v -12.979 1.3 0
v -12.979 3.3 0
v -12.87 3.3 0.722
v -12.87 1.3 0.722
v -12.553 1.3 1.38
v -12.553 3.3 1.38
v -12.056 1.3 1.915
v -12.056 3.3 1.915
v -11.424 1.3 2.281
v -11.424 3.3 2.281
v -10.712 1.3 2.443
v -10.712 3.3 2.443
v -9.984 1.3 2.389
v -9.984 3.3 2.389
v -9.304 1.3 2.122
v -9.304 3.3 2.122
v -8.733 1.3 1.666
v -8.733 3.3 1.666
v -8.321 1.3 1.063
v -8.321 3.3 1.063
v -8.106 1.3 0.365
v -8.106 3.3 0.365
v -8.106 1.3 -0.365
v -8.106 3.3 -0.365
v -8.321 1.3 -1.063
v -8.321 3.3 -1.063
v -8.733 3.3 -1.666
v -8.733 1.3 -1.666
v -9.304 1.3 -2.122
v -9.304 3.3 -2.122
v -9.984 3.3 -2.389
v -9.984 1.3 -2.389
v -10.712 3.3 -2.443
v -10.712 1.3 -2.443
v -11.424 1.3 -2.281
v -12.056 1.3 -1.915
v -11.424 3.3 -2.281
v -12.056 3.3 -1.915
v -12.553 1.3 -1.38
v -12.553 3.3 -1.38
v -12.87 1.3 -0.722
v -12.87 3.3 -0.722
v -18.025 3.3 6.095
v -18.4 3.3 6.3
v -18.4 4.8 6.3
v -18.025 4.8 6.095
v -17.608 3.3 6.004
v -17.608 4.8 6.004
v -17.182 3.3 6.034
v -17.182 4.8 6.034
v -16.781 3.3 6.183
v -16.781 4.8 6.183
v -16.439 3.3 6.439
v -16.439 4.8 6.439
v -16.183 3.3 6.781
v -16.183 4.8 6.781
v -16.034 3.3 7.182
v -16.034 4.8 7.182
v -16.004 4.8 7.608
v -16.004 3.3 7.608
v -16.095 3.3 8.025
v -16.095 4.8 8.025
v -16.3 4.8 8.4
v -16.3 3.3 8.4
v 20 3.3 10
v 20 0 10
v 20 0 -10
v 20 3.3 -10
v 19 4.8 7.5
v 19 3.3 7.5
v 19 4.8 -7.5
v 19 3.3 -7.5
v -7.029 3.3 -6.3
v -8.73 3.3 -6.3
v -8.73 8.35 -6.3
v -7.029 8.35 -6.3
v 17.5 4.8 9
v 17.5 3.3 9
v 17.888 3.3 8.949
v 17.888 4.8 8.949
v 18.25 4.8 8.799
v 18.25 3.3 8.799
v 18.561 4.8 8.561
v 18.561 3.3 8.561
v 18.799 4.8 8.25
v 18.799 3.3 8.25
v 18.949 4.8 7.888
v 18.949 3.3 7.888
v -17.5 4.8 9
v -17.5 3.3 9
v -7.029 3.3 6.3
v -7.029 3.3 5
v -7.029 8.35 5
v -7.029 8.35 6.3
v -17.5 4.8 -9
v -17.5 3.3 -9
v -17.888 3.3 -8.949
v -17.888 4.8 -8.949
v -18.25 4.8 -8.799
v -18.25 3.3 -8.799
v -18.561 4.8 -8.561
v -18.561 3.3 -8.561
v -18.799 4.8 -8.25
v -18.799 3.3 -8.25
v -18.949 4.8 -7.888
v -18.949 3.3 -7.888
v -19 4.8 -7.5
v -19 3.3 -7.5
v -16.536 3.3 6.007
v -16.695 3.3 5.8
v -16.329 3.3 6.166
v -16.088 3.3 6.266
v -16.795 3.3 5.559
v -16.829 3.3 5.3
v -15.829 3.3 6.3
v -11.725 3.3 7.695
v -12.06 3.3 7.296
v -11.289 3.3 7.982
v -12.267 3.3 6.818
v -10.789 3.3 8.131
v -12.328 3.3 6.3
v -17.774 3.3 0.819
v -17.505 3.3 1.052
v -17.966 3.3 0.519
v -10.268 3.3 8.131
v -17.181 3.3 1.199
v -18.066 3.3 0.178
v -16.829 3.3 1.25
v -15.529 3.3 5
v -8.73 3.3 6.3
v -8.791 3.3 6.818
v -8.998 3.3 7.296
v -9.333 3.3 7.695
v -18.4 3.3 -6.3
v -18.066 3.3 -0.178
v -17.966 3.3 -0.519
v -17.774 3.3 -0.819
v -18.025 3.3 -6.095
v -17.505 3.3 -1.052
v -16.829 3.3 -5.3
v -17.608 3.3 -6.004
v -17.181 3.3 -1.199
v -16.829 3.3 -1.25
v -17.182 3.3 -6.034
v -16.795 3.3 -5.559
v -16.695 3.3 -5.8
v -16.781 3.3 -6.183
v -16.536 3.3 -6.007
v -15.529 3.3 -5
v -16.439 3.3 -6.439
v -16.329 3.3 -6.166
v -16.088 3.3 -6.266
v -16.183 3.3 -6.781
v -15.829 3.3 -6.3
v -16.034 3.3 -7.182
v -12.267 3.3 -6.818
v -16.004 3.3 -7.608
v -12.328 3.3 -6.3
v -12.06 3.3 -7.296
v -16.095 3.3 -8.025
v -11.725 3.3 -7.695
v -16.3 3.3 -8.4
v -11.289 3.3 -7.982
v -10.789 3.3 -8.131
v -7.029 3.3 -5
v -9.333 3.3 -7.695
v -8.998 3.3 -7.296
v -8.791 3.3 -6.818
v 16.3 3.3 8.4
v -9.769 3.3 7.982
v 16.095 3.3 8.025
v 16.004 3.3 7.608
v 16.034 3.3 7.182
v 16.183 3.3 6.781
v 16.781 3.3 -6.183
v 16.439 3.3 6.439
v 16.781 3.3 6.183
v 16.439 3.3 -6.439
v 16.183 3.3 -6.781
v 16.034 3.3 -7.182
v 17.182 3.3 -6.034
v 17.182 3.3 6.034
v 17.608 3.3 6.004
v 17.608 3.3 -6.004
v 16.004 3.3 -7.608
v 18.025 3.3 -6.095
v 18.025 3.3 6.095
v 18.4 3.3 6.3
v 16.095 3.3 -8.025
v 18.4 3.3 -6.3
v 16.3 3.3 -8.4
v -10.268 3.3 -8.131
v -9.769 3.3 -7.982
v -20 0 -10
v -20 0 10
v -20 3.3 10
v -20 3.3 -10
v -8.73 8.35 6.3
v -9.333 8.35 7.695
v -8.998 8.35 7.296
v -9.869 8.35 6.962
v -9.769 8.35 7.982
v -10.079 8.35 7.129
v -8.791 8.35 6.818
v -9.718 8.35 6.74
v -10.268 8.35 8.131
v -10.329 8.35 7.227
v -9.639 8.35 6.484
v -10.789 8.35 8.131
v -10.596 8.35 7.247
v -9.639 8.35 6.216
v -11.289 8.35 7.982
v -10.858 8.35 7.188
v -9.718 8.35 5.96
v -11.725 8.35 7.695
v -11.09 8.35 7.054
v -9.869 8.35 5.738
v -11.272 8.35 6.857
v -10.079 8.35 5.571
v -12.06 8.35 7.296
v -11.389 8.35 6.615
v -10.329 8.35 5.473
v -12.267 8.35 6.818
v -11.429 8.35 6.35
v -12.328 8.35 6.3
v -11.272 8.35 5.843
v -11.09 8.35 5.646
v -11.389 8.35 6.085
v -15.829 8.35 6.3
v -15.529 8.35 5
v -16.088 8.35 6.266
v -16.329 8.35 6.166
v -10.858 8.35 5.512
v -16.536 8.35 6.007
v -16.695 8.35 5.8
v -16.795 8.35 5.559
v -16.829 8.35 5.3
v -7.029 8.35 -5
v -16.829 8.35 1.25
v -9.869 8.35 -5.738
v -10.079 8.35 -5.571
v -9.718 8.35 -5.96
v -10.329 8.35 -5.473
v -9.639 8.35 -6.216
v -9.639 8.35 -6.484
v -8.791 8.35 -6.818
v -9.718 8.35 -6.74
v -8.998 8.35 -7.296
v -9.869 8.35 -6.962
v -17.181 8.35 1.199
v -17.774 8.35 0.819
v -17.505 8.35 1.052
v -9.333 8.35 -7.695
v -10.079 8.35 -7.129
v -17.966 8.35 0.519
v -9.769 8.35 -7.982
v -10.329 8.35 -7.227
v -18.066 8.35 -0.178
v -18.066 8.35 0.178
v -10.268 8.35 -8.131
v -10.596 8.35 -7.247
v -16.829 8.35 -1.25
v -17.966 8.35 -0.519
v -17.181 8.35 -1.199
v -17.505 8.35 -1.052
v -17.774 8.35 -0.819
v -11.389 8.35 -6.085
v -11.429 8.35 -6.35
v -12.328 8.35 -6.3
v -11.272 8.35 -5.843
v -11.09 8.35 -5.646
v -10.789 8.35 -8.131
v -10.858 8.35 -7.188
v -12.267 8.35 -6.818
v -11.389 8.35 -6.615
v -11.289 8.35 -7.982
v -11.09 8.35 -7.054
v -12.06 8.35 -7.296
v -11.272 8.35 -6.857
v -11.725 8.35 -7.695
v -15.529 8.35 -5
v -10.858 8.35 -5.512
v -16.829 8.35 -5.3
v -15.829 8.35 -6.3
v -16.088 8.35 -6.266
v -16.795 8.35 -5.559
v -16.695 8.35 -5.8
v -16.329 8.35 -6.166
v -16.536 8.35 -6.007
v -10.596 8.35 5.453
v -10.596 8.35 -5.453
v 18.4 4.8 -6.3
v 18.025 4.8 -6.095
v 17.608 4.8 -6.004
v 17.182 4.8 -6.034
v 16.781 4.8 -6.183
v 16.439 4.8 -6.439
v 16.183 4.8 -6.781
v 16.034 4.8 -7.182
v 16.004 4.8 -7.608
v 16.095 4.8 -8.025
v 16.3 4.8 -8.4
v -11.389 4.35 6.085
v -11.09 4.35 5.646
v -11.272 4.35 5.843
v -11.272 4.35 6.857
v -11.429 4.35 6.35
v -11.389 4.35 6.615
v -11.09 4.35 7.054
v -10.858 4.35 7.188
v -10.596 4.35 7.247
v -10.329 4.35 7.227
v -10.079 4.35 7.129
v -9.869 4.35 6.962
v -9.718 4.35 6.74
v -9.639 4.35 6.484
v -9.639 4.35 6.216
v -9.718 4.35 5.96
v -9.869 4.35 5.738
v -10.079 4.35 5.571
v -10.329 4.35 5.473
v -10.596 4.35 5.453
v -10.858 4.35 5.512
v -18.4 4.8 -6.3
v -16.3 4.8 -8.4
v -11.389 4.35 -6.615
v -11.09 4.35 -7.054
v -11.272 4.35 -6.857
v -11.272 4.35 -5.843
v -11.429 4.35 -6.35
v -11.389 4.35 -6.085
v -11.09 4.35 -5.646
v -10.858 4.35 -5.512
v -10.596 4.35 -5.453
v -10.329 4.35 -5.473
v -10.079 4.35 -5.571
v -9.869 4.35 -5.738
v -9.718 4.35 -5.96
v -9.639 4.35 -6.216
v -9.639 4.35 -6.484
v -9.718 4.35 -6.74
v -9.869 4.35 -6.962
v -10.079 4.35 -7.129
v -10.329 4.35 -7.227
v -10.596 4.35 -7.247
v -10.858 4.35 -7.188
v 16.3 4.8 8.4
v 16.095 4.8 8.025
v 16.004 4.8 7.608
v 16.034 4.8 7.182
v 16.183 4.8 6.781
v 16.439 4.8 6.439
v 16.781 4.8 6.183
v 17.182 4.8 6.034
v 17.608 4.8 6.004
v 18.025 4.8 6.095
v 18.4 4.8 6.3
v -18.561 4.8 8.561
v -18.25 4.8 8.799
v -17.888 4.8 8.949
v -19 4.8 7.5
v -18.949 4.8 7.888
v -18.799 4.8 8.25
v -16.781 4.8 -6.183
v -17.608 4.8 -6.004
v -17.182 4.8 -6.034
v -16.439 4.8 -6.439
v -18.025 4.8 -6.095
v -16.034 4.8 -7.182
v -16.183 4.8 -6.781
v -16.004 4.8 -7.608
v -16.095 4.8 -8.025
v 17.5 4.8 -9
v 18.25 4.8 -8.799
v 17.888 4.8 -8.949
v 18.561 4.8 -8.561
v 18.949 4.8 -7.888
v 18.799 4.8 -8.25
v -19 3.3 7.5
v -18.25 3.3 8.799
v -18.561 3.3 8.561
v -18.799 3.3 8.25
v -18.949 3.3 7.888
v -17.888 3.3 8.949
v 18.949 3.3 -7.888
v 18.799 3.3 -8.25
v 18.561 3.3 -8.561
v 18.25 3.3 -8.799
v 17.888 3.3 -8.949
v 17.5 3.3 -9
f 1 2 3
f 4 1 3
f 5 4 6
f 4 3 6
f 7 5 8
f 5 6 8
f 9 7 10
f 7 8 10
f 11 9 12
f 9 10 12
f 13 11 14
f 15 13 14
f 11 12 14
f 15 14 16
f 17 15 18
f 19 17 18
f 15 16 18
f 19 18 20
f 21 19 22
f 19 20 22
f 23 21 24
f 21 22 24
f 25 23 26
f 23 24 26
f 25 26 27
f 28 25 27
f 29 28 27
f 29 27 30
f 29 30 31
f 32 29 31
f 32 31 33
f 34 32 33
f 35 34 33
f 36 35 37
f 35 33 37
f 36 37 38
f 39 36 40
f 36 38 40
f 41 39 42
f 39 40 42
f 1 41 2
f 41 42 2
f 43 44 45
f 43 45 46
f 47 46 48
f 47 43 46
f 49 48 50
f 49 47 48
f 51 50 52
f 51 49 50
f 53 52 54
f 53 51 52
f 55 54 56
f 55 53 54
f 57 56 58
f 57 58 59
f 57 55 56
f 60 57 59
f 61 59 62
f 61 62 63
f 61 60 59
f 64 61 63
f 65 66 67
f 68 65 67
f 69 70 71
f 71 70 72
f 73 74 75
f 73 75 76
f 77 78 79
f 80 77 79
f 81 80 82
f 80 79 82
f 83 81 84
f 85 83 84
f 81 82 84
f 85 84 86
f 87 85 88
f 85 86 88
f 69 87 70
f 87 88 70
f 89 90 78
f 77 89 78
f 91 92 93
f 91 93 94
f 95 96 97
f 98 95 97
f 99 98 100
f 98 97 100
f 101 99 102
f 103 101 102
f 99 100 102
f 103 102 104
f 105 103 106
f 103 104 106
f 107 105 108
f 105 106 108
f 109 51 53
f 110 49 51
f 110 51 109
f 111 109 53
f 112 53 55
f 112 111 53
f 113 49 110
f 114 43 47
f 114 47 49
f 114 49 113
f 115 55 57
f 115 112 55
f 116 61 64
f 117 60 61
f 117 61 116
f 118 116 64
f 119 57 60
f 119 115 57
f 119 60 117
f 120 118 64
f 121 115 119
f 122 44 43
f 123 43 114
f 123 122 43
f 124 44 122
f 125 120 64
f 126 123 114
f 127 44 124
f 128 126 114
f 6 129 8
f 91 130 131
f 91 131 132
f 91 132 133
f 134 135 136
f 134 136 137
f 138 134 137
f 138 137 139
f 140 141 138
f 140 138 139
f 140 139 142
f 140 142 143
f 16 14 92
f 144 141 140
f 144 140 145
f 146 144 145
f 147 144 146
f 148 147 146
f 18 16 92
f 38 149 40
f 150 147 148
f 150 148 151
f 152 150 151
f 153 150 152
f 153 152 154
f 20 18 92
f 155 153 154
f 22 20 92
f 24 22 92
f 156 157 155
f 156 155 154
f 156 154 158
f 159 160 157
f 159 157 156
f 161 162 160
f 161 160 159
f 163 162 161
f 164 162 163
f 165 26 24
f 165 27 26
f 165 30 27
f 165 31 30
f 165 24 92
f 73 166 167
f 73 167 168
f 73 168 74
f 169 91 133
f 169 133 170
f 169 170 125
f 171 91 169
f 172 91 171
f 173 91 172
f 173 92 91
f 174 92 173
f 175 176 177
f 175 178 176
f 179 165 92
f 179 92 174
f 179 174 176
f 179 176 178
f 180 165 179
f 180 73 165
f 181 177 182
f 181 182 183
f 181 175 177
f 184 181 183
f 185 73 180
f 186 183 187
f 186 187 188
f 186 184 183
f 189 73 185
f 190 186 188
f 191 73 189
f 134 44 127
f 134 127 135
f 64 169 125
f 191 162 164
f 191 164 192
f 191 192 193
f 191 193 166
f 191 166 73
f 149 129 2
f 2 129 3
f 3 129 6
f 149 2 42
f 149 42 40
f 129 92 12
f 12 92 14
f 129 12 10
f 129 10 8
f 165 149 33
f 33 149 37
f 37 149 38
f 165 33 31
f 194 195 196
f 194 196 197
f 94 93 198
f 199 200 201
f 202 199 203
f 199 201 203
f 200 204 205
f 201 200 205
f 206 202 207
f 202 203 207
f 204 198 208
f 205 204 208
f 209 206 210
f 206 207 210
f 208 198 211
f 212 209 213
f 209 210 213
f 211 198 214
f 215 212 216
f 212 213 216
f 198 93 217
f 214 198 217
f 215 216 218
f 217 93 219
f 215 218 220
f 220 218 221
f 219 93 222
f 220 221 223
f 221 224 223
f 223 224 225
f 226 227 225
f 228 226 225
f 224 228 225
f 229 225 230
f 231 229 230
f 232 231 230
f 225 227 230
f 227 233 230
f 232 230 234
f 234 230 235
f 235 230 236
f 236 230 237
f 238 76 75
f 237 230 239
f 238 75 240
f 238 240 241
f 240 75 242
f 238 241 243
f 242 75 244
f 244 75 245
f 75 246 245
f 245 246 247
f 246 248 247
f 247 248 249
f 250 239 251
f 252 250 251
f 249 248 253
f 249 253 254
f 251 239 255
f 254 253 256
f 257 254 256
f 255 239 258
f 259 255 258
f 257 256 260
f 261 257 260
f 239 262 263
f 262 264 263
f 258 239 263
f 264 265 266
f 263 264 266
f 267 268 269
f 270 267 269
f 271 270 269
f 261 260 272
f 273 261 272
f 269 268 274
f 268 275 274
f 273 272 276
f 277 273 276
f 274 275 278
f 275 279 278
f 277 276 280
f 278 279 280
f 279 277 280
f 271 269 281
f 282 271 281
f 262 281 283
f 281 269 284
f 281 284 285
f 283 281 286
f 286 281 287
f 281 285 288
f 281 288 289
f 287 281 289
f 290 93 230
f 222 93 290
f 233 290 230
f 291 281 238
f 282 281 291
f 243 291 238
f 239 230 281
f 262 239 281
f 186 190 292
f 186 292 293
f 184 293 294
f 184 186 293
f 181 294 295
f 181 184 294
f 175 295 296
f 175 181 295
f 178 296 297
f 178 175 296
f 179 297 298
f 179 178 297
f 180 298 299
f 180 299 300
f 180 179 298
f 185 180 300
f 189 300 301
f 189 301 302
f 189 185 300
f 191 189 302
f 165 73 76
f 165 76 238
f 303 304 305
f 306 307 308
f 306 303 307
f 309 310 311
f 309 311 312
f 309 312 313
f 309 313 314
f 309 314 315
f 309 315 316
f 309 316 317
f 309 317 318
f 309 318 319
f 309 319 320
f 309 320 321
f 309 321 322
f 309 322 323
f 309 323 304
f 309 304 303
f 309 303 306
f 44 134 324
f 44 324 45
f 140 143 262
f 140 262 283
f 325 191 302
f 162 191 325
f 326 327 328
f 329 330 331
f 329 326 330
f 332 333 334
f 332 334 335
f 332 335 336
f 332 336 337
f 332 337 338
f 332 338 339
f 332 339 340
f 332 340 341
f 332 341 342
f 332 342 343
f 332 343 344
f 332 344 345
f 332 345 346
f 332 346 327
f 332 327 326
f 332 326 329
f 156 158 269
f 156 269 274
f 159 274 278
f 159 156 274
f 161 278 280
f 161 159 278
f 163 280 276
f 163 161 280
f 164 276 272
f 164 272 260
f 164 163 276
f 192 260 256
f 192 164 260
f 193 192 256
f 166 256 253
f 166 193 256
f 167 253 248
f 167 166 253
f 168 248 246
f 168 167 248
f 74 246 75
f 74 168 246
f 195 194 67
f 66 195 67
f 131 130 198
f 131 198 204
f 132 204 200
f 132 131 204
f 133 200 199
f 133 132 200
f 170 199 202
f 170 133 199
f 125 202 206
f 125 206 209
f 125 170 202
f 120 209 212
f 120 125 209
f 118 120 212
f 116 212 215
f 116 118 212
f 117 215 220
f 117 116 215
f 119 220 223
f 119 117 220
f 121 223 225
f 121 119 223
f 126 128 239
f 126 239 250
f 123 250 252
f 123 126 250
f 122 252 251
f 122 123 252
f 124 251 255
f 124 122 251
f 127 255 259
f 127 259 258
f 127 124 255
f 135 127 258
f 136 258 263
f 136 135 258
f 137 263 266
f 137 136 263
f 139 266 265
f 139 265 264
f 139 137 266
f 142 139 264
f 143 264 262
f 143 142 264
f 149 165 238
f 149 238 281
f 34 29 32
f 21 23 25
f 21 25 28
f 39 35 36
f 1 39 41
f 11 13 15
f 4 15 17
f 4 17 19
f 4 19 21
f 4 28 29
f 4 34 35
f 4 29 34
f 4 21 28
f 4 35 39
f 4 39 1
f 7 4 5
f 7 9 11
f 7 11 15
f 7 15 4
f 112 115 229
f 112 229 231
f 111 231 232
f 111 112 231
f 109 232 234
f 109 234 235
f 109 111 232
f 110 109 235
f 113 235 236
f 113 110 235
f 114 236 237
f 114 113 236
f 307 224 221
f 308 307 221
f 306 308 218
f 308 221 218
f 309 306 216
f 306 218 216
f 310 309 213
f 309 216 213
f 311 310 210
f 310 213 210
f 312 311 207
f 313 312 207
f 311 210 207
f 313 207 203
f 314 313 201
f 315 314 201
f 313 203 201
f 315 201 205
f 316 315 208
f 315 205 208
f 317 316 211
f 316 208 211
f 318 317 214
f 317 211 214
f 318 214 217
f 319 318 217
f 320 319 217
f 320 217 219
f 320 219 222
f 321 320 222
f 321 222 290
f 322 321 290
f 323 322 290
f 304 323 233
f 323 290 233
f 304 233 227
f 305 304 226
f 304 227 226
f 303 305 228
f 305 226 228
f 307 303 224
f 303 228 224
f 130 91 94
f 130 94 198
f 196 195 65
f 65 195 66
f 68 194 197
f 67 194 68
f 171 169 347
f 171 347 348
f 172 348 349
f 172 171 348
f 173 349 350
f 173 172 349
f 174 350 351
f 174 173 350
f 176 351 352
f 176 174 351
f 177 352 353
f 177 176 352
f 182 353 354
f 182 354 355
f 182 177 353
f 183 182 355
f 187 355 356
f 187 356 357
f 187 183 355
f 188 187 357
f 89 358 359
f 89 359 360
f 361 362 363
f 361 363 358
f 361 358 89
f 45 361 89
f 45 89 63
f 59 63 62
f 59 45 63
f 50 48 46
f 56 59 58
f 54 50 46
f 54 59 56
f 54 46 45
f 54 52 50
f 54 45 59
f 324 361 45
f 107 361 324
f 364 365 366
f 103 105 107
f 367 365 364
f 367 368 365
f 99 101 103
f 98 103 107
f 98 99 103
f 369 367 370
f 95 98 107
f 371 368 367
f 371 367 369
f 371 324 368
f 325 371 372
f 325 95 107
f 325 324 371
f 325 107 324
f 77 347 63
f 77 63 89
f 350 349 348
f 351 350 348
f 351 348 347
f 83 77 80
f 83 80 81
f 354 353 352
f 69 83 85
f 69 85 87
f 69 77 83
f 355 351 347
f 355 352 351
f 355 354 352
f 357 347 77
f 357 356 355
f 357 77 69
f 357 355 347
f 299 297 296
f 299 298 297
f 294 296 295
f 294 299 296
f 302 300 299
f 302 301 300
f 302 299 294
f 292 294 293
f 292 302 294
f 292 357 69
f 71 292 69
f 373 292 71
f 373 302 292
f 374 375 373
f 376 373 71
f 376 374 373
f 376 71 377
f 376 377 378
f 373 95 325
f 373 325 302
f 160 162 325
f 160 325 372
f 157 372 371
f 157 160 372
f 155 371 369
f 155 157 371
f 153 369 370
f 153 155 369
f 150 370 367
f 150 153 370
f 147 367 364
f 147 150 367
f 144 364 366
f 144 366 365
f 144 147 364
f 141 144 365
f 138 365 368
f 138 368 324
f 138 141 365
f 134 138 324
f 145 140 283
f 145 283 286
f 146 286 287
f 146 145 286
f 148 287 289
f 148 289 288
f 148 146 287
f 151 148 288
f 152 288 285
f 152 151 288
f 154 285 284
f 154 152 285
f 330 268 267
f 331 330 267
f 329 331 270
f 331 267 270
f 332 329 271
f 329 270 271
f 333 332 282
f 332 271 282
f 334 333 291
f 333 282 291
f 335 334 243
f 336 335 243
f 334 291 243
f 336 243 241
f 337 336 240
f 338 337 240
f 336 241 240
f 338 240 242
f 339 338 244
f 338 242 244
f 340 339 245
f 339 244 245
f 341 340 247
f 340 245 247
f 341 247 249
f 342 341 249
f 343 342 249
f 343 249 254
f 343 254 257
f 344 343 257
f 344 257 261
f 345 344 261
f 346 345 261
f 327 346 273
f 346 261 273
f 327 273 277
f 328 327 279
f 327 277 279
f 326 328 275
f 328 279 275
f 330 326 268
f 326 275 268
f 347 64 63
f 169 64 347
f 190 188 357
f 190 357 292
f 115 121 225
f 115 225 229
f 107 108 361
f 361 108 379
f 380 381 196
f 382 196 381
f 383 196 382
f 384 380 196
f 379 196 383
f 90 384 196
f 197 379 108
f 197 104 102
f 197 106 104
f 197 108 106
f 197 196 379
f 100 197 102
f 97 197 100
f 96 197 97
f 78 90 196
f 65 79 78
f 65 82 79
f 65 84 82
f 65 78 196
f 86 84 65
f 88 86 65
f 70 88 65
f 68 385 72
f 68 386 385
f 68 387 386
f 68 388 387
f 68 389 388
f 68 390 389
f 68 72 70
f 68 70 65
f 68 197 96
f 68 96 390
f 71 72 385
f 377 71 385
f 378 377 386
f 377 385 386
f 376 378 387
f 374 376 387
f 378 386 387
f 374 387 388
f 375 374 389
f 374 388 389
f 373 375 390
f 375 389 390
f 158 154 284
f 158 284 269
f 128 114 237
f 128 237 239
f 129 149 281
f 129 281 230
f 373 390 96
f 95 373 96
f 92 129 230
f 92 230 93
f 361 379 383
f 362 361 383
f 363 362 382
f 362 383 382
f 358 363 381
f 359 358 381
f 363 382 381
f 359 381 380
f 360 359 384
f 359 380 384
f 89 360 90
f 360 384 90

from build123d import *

# Parameters (mm, degrees)
SKETCH1_W           = 40
SKETCH1_H           = 20
BOSS_EXTRUDE1_DEPTH = 3.3
BOSS_EXTRUDE2_DEPTH = 1.5
SKETCH3_R           = 2.45
CUT_EXTRUDE1_DEPTH  = 2
BOSS_EXTRUDE3_DEPTH = 5.05
SKETCH5_R           = 0.9
CUT_EXTRUDE2_DEPTH  = 4


with BuildPart() as part:
    # Sketch1 → Boss-Extrude1 (new body)
    with BuildSketch(Plane(origin=(0, 0, 0), x_dir=(1, 0, 0), z_dir=(0, 1, 0))):
        Rectangle(SKETCH1_W, SKETCH1_H)
    extrude(amount=BOSS_EXTRUDE1_DEPTH)

    # Sketch2 → Boss-Extrude2 (add)
    with BuildSketch(Plane(origin=(0, 3.3, 0), x_dir=(1, 0, 0), z_dir=(0, 1, 0))):
        with BuildLine():
            Line((-19, 7.5), (-19, -7.5))
            ThreePointArc((-19, -7.5), (-18.560660172, -8.560660172), (-17.5, -9))
            Line((-17.5, -9), (17.5, -9))
            ThreePointArc((17.5, -9), (18.560660172, -8.560660172), (19, -7.5))
            Line((19, -7.5), (19, 7.5))
            ThreePointArc((19, 7.5), (18.560660172, 8.560660172), (17.5, 9))
            Line((17.5, 9), (-17.5, 9))
            ThreePointArc((-17.5, 9), (-18.560660172, 8.560660172), (-19, 7.5))
        make_face()
        with BuildLine():
            Line((-18.4, 6.3), (-18.4, -6.3))
            ThreePointArc((-18.4, -6.3), (-16.439339828, -6.439339828), (-16.3, -8.4))
            Line((-16.3, -8.4), (16.3, -8.4))
            ThreePointArc((16.3, -8.4), (16.439339828, -6.439339828), (18.4, -6.3))
            Line((18.4, -6.3), (18.4, 6.3))
            ThreePointArc((18.4, 6.3), (16.439339828, 6.439339828), (16.3, 8.4))
            Line((16.3, 8.4), (-16.3, 8.4))
            ThreePointArc((-16.3, 8.4), (-16.439339828, 6.439339828), (-18.4, 6.3))
        make_face(mode=Mode.SUBTRACT)
    extrude(amount=BOSS_EXTRUDE2_DEPTH)

    # Sketch3 → Cut-Extrude1 (cut)
    with BuildSketch(Plane(origin=(0, 3.3, 0), x_dir=(-1, 0, 0), z_dir=(0, 1, 0))):
        with Locations((10.52883238, 0)):
            Circle(SKETCH3_R)
    extrude(amount=-CUT_EXTRUDE1_DEPTH, mode=Mode.SUBTRACT)

    # Sketch4 → Boss-Extrude3 (add)
    with BuildSketch(Plane(origin=(0, 3.3, 0), x_dir=(1, 0, 0), z_dir=(0, 1, 0))):
        with BuildLine():
            Line((-15.52883238, -5), (-7.02883238, -5))
            Line((-7.02883238, -5), (-7.02883238, -6.3))
            Line((-7.02883238, -6.3), (-8.729526959, -6.3))
            ThreePointArc((-8.729526959, -6.3), (-10.52883238, -8.15), (-12.328137802, -6.3))
            Line((-12.328137802, -6.3), (-15.82883238, -6.3))
            ThreePointArc((-15.82883238, -6.3), (-16.535939162, -6.007106781), (-16.82883238, -5.3))
            Line((-16.82883238, -5.3), (-16.82883238, -1.25))
            ThreePointArc((-16.82883238, -1.25), (-18.07883238, 0), (-16.82883238, 1.25))
            Line((-16.82883238, 1.25), (-16.82883238, 5.3))
            ThreePointArc((-16.82883238, 5.3), (-16.535939162, 6.007106781), (-15.82883238, 6.3))
            Line((-15.82883238, 6.3), (-12.328137802, 6.3))
            ThreePointArc((-12.328137802, 6.3), (-10.52883238, 8.15), (-8.729526959, 6.3))
            Line((-8.729526959, 6.3), (-7.02883238, 6.3))
            Line((-7.02883238, 6.3), (-7.02883238, 5))
            Line((-7.02883238, 5), (-15.52883238, 5))
            Line((-15.52883238, 5), (-15.52883238, -5))
        make_face()
    extrude(amount=BOSS_EXTRUDE3_DEPTH)

    # Sketch5 → Cut-Extrude2 (cut)
    with BuildSketch(Plane(origin=(0, 8.35, 0), x_dir=(-1, 0, 0), z_dir=(0, 1, 0))):
        with Locations((10.52883238, 6.35)):
            Circle(SKETCH5_R)
        with Locations((10.52883238, -6.35)):
            Circle(SKETCH5_R)
    extrude(amount=-CUT_EXTRUDE2_DEPTH, mode=Mode.SUBTRACT)


solid = part.part
